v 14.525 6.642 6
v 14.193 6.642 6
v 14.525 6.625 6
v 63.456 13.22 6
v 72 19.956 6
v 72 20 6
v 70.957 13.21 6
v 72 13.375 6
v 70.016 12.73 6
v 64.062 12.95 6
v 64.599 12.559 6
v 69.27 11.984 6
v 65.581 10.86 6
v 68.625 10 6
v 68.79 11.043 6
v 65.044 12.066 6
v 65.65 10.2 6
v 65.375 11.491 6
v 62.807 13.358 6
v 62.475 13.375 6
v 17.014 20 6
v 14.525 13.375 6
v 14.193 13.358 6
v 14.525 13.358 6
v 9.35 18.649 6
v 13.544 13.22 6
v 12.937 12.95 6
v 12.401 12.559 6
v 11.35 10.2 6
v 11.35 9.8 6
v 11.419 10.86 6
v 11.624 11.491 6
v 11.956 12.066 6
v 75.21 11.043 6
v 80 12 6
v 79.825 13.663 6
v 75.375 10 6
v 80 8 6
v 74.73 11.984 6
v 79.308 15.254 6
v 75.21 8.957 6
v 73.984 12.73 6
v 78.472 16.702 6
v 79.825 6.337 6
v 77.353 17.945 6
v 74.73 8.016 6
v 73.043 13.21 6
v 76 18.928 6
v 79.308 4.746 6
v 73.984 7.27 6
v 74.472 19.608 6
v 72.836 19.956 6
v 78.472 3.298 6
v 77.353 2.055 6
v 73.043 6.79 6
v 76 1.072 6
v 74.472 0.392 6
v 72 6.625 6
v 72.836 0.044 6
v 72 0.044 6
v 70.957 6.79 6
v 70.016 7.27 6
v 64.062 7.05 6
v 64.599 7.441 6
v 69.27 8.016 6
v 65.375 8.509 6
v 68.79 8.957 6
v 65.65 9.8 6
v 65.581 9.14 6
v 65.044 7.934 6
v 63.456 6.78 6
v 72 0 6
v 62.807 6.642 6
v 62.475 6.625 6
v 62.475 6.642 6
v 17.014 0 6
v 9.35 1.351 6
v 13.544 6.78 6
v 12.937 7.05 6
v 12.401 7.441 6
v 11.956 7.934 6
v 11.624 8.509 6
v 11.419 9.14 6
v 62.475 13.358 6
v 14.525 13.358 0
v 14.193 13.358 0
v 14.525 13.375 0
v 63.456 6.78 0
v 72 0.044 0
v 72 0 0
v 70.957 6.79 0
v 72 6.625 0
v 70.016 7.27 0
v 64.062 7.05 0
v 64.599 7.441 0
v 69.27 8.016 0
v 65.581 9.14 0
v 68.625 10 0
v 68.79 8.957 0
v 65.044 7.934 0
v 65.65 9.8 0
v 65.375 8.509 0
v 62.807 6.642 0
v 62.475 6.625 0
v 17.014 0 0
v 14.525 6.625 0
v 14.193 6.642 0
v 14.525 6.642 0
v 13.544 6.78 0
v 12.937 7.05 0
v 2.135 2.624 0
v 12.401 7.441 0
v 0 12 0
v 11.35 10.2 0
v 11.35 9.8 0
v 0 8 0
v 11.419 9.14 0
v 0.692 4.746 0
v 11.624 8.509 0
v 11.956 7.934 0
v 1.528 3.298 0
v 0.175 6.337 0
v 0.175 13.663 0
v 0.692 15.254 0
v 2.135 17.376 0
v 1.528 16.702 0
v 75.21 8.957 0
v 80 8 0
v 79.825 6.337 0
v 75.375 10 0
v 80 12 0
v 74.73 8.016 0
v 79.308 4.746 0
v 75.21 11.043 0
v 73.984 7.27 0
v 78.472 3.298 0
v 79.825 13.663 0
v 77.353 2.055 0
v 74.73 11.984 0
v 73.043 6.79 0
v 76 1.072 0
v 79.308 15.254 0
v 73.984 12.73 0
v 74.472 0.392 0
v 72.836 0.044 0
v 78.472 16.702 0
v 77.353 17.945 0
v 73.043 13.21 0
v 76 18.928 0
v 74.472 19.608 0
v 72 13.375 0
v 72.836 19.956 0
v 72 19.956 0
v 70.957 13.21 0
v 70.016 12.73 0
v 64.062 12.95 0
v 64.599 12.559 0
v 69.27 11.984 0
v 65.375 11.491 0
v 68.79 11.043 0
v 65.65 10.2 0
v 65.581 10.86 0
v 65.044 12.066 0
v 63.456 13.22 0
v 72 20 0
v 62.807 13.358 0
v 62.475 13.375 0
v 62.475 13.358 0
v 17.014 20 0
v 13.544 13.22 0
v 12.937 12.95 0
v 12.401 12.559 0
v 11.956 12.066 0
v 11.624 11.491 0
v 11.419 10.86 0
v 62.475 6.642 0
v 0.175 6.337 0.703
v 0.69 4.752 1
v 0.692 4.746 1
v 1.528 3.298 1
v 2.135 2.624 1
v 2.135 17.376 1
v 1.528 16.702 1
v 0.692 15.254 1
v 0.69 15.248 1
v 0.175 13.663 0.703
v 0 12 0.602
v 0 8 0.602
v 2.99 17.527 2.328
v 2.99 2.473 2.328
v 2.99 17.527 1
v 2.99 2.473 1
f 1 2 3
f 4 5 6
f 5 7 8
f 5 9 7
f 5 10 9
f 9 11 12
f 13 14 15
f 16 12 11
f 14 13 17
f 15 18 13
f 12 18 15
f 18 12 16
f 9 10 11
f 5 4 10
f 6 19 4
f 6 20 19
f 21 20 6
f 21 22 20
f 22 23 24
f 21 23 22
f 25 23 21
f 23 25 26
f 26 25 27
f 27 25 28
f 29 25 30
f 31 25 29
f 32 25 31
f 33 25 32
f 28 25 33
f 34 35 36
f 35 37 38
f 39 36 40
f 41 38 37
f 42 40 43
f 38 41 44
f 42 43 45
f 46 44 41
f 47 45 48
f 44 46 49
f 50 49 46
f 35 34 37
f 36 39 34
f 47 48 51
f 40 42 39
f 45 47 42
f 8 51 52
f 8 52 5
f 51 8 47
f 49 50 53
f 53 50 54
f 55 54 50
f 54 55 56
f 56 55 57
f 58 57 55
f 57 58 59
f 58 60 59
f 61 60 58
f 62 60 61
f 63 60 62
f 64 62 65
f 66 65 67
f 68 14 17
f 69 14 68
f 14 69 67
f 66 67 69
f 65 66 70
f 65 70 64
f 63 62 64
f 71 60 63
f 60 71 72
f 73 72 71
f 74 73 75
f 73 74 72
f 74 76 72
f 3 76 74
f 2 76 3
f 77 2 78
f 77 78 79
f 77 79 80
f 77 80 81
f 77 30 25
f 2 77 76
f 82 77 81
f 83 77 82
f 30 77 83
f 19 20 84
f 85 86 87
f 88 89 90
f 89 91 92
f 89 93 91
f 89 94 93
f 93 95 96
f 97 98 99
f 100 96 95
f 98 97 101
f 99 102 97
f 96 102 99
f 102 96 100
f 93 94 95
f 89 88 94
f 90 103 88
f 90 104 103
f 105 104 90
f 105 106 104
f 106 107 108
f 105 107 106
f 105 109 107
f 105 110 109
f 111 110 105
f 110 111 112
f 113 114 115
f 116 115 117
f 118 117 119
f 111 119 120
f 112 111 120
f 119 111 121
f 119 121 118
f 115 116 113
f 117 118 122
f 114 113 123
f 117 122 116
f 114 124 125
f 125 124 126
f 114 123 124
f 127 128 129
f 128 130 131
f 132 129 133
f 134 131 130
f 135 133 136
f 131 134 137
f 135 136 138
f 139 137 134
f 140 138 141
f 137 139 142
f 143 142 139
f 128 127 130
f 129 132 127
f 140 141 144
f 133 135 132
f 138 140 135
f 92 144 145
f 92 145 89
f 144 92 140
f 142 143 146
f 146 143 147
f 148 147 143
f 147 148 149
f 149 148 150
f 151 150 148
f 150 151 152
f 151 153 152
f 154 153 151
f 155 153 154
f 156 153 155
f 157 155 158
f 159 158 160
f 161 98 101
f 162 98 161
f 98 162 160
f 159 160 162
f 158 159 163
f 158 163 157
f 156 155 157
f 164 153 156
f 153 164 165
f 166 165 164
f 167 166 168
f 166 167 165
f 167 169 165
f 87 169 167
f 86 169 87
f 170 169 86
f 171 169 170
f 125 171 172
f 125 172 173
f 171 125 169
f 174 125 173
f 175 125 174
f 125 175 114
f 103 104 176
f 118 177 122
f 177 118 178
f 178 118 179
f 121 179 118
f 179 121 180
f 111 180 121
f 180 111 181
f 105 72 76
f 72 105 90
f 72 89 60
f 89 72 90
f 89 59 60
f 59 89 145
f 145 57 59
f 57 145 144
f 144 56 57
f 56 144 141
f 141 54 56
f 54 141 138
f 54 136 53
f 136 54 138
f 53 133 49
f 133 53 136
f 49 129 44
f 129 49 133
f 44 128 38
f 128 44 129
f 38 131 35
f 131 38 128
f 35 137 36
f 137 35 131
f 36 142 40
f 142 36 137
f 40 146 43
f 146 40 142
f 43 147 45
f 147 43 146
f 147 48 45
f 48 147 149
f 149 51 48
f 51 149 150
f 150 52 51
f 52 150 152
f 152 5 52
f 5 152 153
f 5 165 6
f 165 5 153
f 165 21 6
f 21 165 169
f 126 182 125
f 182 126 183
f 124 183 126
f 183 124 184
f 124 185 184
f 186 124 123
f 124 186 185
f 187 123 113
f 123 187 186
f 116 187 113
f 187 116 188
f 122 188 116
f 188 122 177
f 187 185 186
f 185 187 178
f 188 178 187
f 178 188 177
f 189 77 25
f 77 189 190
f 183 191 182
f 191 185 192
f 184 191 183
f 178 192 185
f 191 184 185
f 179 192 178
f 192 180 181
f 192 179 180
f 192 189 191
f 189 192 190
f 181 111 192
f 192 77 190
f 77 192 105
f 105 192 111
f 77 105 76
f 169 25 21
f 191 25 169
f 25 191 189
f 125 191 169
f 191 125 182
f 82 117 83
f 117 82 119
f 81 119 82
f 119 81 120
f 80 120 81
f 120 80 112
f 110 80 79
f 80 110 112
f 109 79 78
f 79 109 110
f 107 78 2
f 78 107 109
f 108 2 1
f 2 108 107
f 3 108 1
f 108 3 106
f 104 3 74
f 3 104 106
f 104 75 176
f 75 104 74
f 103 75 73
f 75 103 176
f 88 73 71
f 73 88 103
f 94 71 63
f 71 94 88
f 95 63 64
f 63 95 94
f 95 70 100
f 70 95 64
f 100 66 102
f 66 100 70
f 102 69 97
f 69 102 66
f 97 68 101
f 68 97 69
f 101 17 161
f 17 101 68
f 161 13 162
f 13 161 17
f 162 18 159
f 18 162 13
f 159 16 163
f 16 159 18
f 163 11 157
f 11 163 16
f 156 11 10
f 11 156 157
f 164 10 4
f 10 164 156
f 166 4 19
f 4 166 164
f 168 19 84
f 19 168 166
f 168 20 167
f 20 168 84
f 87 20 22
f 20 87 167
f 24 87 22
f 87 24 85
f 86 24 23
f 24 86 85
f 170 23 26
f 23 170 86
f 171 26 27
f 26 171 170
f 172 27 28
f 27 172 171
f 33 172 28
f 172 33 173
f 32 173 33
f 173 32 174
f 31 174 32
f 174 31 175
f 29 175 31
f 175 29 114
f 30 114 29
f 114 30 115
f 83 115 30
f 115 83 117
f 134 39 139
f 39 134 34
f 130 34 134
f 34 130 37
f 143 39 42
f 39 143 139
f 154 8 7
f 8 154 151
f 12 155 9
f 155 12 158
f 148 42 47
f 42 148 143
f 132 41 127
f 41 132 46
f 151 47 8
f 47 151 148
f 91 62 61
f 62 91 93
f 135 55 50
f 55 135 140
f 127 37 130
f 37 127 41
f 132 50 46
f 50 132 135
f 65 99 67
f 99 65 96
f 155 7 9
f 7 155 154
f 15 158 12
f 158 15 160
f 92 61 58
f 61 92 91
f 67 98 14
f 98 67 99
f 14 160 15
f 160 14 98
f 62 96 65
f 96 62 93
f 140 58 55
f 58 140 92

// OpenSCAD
// preview[view:south west, tilt:diagonal]
/* [General] */

part="hclamp"; // [clamp_tray:Clamp Tray,rod_tray:Rod Dray,dual_tray:Dual Tray,hclamp:Flat(H) Clamp,vclamp:V-Clamp,tvclamp:Tall V-Clamp,vclamp_rod:V-Clamp Rod,presser:Presser,grip:Grip,preview:Preview All]
// Bolt Diameter
boltd=6.35; // [3:M3,4:M4,5:M5,6:M6,7:M7,8:M8,3.175:1/8",4.7625:3/16",6.35:1/4",7.9375:5/16",9.525:3/8",11.1125:7/16",12.7:1/2"]

/* [Flat Clamp] */

// Flat Clamp Width (X)
hcw=80; // [40:120]
// Flat Clamp Height (Y)
hch=20; // [10:40]
// Flat Clamp Depth (Z)
hcd=6; // [4:0.1:20]
// Flat Clamp Extra Notch
hnotch=1; // [1:Yes,2:No]

/* [V-Clamp] */

// V-Clamp Width (X)
vcw=76; // [40:120]
// V-Clamp Height (Y)
vch=20; // [10:40]
// V-Clamp Depth
vcd=16; // [10:0.1:40]
// V-Clamp Rod diameter
vcrd=12; // [10:20]

/* [Others] */

// Clamp Tray Count
ctray_count=12; // [1:20]

// Grip Big Diameter
gripd=40; // [20:60]

if(part=="clamp_tray")
    clamp_tray();
else if(part=="dual_tray")
{
  clamp_tray();
  translate([ctray_count*9,0])
    m4_tray(left=0);
} else if(part=="rod_tray") {
  m4_tray();
} else if(part=="vclamp_rod") {
  vclamp_rod();
} else if(part=="hclamp")
{
  translate([0,0,hcd]) mirror([0,0,1]) hclamp();
} else if(part=="vclamp")
{
  translate([0,0,vch]) rotate([-90,0])
  vclamp();
} else if(part=="tvclamp") {
   rotate([90,0]) tvclamp();
} else if(part=="presser") {
  mirror([0,0,1]) presser();
} else if(part=="grip")
{
  grip(gripd);
} else if(part=="preview")
{
  color("lightblue") clamp_tray();
  color("lightgreen") translate([ctray_count*9,0]) m4_tray(left=0);
  color("yellow") for(x=[0:(ctray_count-1)/2-2]) {
    translate([8.5+x*9,2.5,hcw+2]) rotate([0,-90,0]) mirror([1,0]) hclamp();
  }
  color("red") for(x=[0:2]) {
    translate([((ctray_count-1)/2-2)*9+20+x*18,2.5,2.5]) rotate([0,-78]) vclamp();
  }
  for(x=[0:1:4],y=[0:1]) {
    if(x%2!=y%2)
    translate([ctray_count*9+6+x*10,6+y*12])
    {
      color("silver") cylinder(d=4,h=50,$fn=20);
      translate([0,0,25+x*5+y*10-(x==4?5:0)])
      {
        color("gray") mirror([0,0,1]) rotate([0,0,30]) grip();
        if(x>2)
          color("pink") translate([(vcrd-1)*-.5,vch*-.5,-15]) mirror([0,0,1]) vclamp_rod();
      }
    }
  }
}
module clamp_tray() {
  difference() {
    box([2+ctray_count*9,25,20],bottom=0,r=2);
    for(x=[0:ctray_count-1]) {
      translate([2+x*9,2,2]) cube([7,21,20]);
    }
  }
}  
module m4_tray(left=1) {
  difference(){
    union(){
      translate([0,0]) box([52,25,18],left=left,bottom=0,r=2);
      *translate([115,0,4]) {
        for(x=[0:6],y=[0:1]){
          translate([x*10,6+y*12]) cylinder(d=7,h=16,$fn=20);
        }
      }
    }
    translate([6,0,4]) {
      for(x=[0:4],y=[0:1]){
        translate([x*10,6+y*12]) cylinder(d=boltd+.5,h=20,$fn=20);
      }
    }
  }
}
module presser() {
  difference(){
    union() {
      sphere(d=13+boltd,$fn=50);
    }
    translate([0,0,boltd>5?-2:0])
      cylinder(d=boltd+.2,h=20,$fn=20);
    translate([0,0,boltd>5?1:3])
      cylinder(d=boltd*2+.2,h=30,$fn=6);
    translate([-10,-10,5])
      cube(20);
  }
}
module tvclamp() {
  tvh=48;
  difference(){
    union() {
      box([vcw-20,vcd,4],front=0);
      translate([vcw-24,0]) box([4,vcd,tvh],front=0);
      translate([vcw-24,0,tvh-5]) box([24,vcd,5],front=0);
      translate([vcw-24,0,tvh-24]) intersection() {
        rotate([0,-45]) box([40,2,40],r=1,front=0);
          box([24,2,24],r=1,front=0);
      }
      translate([vcw-60,0,0]) intersection() {
        rotate([0,45]) box([60,2,60],r=1,front=0);
          box([40,2,40],r=1,front=0);
      }
    }
    *translate([vcw-20,-.01,tvh-4])
      rotate([0,90,0]) cube([80,vcd+.02,30]);
    *translate([-.01,-.01,4]) cube([50,vcd+.02,80]);
    translate([vcw-vcd/2,vcd/2,0]) {
      cylinder(d=4,h=tvh+.02,$fn=20);
      translate([0,0,tvh-5]) rotate([0,0,30]) cylinder(d=8.2,h=3,$fn=6);
    }
    for(x=[vcd/2:16:44]) {
      translate([x,vcd/2,-.01]) cylinder(d=4,h=5,$fn=20);
    }
  }
  %translate([vcw-vcd/2,vcd/2,tvh-15]) presser();
}
module box(size,r=1,top=1,bottom=1,left=1,right=1,front=1,back=1)
{
  w=size[0];
  d=size[1];
  h=size[2];
  intersection(){
    cube([w,d,h]);
    minkowski(){
      translate([left?r:0,front?r:0,bottom?r:0]) cube([w-(left?r:0)-(right?r:0),d-(front?r:0)-(back?r:0),h-(top?r:0)-(bottom?r:0)]);
      sphere(r,$fn=30);
    }
  }
}
module rounded_rect(w,h,r) {
  translate([r,r]) circle(d=r*2,$fn=30);
  translate([r,h-r]) circle(d=r*2,$fn=30);
  translate([w-r,h-r]) circle(d=r*2,$fn=30);
  translate([w-r,r]) circle(d=r*2,$fn=30);
  translate([r,0]) square([w-r*2,h]);
  translate([0,r]) square([r,h-r*2]);
  translate([w-r,r]) square([r,h-r*2]);
}
module rounded_cube(dims,rsides=2,rvert=0)
{
  w=dims[0];
  h=dims[1];
  d=dims[2];
  if(rvert==0)
  {
    linear_extrude(d) rounded_rect(w,h,rsides);
  } else {
    translate([rsides,rsides,rvert]) scale([1,1,rvert/rsides]) minkowski() {
      cube([w-rsides*2,h-rsides*2,(d-rvert*2)/(rvert/rsides)]);
      sphere(rsides,$fn=30);
    }
  }
}
module hclamp() {
  difference(){
    rounded_cube([hcw,hch,hcd],8);
    translate([3+boltd,-.01]) mirror([1,0]) rotate([0,60]) cube([10,hch+.02,20]);
    if(hnotch)
      translate([-.01,-.01,hcd-1]) mirror([0,0,1]) cube([3,hch,hcd]);
    translate([0,3,-.01]) mirror([0,1,0]) rotate([0,0,10]) cube(20);
    translate([0,hch-3,-.01]) rotate([0,0,10]) cube(20);
    translate([5+boltd,hch/2-boltd/2-.2,-.01]) rounded_cube([hcw-13-boltd*2,boltd+.4,8.02],boltd/2);
    translate([hcw-8,hch/2,-.01]) cylinder(d=boltd+.4,h=8.02,$fn=20);
  }
}
module vclamp() {
  difference(){
    translate([0,vch]) rotate([90,0]) rounded_cube([vcw,vcd,vch],rsides=2,rvert=0);
    
    translate([0,-.01,1]) rotate([0,-18,0]) cube([vcw,vch+.02,vcd]);
    translate([vcw*2/3,0,0]) {
      translate([vcrd/2-.5,-.01,vcd]) rotate([0,35]) cube([vcw,vch+.02,vcd]);
      translate([0,-.01,vcd]) rotate([-90,0]) cylinder(d=vcrd,h=vch+.02,$fn=30);
      translate([0,-.01,vcd-vcrd/2-4]) mirror([0,0,1]) rotate([0,-15,0]) cube([vcw,vch+.02,vcd]);
      translate([0,-.01,vcd-vcrd/2-4]) mirror([0,0,1]) mirror([1,0]) rotate([0,-7,0]) cube([vcw,vch+.02,vcd]);
      for(r=[-35:5:50])
        translate([0,vch/2,vcd-.01]) rotate([0,r]) translate([0,0,vcd*-2]) cylinder(d=boltd+.5,h=vch+vcd,$fn=20);
    }
  }
}
module vclamp_rod() {
  difference(){
    intersection(){
      cube([vcrd-1,vch,(vcrd-1)/2]);
      translate([(vcrd-1)/2,0]) rotate([-90,0]) cylinder(d=vcrd-1,h=vch,$fn=30);
    }
    translate([(vcrd-1)/2,vch/2,-.01]) cylinder(d=boltd+.5,h=vch,$fn=20);
  }
}
module grip(od=gripd,md=boltd)
{
  nuth=(boltd==4?3:(boltd>8?6:4));  
  difference(){
    union(){
      cylinder(d=od,h=nuth+1,$fn=6);
      translate([0,0,nuth+1]) cylinder(d1=18,d2=12,h=3,$fn=30);
      translate([0,0,nuth+3]) cylinder(d=12,h=nuth*2,$fn=30);
      for(d=[0:60:330])
        rotate([0,0,d]) translate([od/2,0]) cylinder(d=od/5,h=nuth+1,$fn=30);
    }
    translate([0,0,-.01]) cylinder(d=md*2+.2,h=nuth+.2,$fn=6);
    translate([0,0,-.01]) cylinder(d=md+.5,h=40.02,$fn=20);
    for(d=[30:60:330])
      rotate([0,0,d]) translate([od/2,0,-.01]) cylinder(d=od/3,h=nuth+1.02,$fn=30);
  }
}
